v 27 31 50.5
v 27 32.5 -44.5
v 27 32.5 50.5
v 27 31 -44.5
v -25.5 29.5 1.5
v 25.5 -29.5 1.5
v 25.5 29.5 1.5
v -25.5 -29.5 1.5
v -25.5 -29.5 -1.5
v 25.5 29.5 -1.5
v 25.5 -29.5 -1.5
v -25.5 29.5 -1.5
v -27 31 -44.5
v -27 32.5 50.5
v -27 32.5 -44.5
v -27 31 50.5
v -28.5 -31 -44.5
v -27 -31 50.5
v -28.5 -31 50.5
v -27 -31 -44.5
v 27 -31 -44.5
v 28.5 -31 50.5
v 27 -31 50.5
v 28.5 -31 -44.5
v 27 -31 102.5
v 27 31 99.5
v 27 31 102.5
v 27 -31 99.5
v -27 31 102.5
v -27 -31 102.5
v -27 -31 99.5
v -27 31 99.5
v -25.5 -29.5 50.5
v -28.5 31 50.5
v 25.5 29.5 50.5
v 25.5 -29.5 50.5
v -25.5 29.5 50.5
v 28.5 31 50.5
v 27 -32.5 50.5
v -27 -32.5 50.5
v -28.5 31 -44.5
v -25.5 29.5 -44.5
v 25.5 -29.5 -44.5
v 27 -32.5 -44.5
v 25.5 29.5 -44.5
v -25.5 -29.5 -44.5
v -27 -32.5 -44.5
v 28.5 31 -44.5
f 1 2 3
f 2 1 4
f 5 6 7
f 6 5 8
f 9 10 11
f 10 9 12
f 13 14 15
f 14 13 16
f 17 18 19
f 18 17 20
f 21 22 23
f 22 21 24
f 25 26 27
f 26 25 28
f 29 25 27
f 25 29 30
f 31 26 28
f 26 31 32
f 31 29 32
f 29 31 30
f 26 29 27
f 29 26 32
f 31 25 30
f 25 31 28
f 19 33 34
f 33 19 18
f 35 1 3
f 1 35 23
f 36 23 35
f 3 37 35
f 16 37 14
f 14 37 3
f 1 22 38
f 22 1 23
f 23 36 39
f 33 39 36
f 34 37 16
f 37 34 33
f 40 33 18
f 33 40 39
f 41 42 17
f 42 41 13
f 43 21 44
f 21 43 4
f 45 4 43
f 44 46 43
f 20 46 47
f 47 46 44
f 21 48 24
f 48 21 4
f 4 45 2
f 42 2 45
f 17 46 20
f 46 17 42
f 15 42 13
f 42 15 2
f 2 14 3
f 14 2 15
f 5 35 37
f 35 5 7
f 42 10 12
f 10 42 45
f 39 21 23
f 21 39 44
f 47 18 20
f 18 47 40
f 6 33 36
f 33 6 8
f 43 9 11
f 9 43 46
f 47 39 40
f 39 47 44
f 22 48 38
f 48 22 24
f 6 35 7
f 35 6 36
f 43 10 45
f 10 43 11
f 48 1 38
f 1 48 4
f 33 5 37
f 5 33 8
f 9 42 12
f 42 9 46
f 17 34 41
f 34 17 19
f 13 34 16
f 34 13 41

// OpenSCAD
// Parameters for the enclosure
module arduino_uno_enclosure(width, height, depth, wall_thickness) {
  // Calculate the inner dimensions of the enclosure
  width_inner = width - 2 * wall_thickness;
  height_inner = height - 2 * wall_thickness;
  depth_inner = depth - 2 * wall_thickness;

  // Create the bottom of the enclosure
  translate([0, 0, 0])
    cube([width, depth, wall_thickness], center = true);

  // Create the top of the enclosure
  translate([0, 0, height])
    cube([width, depth, wall_thickness], center = true);

  // Create the sides of the enclosure
  translate([0, depth/2, wall_thickness])
    cube([width, wall_thickness, height_inner], center = true);
  translate([0, -depth/2, wall_thickness])
    cube([width, wall_thickness, height_inner], center = true);

  // Create the front and back of the enclosure
  translate([width/2, 0, wall_thickness])
    cube([wall_thickness, depth, height_inner], center = true);
  translate([-width/2, 0, wall_thickness])
    cube([wall_thickness, depth, height_inner], center = true);
}

// Render the enclosure with default parameters
arduino_uno_enclosure(width = 54, height = 101, depth = 62, wall_thickness = 3);
